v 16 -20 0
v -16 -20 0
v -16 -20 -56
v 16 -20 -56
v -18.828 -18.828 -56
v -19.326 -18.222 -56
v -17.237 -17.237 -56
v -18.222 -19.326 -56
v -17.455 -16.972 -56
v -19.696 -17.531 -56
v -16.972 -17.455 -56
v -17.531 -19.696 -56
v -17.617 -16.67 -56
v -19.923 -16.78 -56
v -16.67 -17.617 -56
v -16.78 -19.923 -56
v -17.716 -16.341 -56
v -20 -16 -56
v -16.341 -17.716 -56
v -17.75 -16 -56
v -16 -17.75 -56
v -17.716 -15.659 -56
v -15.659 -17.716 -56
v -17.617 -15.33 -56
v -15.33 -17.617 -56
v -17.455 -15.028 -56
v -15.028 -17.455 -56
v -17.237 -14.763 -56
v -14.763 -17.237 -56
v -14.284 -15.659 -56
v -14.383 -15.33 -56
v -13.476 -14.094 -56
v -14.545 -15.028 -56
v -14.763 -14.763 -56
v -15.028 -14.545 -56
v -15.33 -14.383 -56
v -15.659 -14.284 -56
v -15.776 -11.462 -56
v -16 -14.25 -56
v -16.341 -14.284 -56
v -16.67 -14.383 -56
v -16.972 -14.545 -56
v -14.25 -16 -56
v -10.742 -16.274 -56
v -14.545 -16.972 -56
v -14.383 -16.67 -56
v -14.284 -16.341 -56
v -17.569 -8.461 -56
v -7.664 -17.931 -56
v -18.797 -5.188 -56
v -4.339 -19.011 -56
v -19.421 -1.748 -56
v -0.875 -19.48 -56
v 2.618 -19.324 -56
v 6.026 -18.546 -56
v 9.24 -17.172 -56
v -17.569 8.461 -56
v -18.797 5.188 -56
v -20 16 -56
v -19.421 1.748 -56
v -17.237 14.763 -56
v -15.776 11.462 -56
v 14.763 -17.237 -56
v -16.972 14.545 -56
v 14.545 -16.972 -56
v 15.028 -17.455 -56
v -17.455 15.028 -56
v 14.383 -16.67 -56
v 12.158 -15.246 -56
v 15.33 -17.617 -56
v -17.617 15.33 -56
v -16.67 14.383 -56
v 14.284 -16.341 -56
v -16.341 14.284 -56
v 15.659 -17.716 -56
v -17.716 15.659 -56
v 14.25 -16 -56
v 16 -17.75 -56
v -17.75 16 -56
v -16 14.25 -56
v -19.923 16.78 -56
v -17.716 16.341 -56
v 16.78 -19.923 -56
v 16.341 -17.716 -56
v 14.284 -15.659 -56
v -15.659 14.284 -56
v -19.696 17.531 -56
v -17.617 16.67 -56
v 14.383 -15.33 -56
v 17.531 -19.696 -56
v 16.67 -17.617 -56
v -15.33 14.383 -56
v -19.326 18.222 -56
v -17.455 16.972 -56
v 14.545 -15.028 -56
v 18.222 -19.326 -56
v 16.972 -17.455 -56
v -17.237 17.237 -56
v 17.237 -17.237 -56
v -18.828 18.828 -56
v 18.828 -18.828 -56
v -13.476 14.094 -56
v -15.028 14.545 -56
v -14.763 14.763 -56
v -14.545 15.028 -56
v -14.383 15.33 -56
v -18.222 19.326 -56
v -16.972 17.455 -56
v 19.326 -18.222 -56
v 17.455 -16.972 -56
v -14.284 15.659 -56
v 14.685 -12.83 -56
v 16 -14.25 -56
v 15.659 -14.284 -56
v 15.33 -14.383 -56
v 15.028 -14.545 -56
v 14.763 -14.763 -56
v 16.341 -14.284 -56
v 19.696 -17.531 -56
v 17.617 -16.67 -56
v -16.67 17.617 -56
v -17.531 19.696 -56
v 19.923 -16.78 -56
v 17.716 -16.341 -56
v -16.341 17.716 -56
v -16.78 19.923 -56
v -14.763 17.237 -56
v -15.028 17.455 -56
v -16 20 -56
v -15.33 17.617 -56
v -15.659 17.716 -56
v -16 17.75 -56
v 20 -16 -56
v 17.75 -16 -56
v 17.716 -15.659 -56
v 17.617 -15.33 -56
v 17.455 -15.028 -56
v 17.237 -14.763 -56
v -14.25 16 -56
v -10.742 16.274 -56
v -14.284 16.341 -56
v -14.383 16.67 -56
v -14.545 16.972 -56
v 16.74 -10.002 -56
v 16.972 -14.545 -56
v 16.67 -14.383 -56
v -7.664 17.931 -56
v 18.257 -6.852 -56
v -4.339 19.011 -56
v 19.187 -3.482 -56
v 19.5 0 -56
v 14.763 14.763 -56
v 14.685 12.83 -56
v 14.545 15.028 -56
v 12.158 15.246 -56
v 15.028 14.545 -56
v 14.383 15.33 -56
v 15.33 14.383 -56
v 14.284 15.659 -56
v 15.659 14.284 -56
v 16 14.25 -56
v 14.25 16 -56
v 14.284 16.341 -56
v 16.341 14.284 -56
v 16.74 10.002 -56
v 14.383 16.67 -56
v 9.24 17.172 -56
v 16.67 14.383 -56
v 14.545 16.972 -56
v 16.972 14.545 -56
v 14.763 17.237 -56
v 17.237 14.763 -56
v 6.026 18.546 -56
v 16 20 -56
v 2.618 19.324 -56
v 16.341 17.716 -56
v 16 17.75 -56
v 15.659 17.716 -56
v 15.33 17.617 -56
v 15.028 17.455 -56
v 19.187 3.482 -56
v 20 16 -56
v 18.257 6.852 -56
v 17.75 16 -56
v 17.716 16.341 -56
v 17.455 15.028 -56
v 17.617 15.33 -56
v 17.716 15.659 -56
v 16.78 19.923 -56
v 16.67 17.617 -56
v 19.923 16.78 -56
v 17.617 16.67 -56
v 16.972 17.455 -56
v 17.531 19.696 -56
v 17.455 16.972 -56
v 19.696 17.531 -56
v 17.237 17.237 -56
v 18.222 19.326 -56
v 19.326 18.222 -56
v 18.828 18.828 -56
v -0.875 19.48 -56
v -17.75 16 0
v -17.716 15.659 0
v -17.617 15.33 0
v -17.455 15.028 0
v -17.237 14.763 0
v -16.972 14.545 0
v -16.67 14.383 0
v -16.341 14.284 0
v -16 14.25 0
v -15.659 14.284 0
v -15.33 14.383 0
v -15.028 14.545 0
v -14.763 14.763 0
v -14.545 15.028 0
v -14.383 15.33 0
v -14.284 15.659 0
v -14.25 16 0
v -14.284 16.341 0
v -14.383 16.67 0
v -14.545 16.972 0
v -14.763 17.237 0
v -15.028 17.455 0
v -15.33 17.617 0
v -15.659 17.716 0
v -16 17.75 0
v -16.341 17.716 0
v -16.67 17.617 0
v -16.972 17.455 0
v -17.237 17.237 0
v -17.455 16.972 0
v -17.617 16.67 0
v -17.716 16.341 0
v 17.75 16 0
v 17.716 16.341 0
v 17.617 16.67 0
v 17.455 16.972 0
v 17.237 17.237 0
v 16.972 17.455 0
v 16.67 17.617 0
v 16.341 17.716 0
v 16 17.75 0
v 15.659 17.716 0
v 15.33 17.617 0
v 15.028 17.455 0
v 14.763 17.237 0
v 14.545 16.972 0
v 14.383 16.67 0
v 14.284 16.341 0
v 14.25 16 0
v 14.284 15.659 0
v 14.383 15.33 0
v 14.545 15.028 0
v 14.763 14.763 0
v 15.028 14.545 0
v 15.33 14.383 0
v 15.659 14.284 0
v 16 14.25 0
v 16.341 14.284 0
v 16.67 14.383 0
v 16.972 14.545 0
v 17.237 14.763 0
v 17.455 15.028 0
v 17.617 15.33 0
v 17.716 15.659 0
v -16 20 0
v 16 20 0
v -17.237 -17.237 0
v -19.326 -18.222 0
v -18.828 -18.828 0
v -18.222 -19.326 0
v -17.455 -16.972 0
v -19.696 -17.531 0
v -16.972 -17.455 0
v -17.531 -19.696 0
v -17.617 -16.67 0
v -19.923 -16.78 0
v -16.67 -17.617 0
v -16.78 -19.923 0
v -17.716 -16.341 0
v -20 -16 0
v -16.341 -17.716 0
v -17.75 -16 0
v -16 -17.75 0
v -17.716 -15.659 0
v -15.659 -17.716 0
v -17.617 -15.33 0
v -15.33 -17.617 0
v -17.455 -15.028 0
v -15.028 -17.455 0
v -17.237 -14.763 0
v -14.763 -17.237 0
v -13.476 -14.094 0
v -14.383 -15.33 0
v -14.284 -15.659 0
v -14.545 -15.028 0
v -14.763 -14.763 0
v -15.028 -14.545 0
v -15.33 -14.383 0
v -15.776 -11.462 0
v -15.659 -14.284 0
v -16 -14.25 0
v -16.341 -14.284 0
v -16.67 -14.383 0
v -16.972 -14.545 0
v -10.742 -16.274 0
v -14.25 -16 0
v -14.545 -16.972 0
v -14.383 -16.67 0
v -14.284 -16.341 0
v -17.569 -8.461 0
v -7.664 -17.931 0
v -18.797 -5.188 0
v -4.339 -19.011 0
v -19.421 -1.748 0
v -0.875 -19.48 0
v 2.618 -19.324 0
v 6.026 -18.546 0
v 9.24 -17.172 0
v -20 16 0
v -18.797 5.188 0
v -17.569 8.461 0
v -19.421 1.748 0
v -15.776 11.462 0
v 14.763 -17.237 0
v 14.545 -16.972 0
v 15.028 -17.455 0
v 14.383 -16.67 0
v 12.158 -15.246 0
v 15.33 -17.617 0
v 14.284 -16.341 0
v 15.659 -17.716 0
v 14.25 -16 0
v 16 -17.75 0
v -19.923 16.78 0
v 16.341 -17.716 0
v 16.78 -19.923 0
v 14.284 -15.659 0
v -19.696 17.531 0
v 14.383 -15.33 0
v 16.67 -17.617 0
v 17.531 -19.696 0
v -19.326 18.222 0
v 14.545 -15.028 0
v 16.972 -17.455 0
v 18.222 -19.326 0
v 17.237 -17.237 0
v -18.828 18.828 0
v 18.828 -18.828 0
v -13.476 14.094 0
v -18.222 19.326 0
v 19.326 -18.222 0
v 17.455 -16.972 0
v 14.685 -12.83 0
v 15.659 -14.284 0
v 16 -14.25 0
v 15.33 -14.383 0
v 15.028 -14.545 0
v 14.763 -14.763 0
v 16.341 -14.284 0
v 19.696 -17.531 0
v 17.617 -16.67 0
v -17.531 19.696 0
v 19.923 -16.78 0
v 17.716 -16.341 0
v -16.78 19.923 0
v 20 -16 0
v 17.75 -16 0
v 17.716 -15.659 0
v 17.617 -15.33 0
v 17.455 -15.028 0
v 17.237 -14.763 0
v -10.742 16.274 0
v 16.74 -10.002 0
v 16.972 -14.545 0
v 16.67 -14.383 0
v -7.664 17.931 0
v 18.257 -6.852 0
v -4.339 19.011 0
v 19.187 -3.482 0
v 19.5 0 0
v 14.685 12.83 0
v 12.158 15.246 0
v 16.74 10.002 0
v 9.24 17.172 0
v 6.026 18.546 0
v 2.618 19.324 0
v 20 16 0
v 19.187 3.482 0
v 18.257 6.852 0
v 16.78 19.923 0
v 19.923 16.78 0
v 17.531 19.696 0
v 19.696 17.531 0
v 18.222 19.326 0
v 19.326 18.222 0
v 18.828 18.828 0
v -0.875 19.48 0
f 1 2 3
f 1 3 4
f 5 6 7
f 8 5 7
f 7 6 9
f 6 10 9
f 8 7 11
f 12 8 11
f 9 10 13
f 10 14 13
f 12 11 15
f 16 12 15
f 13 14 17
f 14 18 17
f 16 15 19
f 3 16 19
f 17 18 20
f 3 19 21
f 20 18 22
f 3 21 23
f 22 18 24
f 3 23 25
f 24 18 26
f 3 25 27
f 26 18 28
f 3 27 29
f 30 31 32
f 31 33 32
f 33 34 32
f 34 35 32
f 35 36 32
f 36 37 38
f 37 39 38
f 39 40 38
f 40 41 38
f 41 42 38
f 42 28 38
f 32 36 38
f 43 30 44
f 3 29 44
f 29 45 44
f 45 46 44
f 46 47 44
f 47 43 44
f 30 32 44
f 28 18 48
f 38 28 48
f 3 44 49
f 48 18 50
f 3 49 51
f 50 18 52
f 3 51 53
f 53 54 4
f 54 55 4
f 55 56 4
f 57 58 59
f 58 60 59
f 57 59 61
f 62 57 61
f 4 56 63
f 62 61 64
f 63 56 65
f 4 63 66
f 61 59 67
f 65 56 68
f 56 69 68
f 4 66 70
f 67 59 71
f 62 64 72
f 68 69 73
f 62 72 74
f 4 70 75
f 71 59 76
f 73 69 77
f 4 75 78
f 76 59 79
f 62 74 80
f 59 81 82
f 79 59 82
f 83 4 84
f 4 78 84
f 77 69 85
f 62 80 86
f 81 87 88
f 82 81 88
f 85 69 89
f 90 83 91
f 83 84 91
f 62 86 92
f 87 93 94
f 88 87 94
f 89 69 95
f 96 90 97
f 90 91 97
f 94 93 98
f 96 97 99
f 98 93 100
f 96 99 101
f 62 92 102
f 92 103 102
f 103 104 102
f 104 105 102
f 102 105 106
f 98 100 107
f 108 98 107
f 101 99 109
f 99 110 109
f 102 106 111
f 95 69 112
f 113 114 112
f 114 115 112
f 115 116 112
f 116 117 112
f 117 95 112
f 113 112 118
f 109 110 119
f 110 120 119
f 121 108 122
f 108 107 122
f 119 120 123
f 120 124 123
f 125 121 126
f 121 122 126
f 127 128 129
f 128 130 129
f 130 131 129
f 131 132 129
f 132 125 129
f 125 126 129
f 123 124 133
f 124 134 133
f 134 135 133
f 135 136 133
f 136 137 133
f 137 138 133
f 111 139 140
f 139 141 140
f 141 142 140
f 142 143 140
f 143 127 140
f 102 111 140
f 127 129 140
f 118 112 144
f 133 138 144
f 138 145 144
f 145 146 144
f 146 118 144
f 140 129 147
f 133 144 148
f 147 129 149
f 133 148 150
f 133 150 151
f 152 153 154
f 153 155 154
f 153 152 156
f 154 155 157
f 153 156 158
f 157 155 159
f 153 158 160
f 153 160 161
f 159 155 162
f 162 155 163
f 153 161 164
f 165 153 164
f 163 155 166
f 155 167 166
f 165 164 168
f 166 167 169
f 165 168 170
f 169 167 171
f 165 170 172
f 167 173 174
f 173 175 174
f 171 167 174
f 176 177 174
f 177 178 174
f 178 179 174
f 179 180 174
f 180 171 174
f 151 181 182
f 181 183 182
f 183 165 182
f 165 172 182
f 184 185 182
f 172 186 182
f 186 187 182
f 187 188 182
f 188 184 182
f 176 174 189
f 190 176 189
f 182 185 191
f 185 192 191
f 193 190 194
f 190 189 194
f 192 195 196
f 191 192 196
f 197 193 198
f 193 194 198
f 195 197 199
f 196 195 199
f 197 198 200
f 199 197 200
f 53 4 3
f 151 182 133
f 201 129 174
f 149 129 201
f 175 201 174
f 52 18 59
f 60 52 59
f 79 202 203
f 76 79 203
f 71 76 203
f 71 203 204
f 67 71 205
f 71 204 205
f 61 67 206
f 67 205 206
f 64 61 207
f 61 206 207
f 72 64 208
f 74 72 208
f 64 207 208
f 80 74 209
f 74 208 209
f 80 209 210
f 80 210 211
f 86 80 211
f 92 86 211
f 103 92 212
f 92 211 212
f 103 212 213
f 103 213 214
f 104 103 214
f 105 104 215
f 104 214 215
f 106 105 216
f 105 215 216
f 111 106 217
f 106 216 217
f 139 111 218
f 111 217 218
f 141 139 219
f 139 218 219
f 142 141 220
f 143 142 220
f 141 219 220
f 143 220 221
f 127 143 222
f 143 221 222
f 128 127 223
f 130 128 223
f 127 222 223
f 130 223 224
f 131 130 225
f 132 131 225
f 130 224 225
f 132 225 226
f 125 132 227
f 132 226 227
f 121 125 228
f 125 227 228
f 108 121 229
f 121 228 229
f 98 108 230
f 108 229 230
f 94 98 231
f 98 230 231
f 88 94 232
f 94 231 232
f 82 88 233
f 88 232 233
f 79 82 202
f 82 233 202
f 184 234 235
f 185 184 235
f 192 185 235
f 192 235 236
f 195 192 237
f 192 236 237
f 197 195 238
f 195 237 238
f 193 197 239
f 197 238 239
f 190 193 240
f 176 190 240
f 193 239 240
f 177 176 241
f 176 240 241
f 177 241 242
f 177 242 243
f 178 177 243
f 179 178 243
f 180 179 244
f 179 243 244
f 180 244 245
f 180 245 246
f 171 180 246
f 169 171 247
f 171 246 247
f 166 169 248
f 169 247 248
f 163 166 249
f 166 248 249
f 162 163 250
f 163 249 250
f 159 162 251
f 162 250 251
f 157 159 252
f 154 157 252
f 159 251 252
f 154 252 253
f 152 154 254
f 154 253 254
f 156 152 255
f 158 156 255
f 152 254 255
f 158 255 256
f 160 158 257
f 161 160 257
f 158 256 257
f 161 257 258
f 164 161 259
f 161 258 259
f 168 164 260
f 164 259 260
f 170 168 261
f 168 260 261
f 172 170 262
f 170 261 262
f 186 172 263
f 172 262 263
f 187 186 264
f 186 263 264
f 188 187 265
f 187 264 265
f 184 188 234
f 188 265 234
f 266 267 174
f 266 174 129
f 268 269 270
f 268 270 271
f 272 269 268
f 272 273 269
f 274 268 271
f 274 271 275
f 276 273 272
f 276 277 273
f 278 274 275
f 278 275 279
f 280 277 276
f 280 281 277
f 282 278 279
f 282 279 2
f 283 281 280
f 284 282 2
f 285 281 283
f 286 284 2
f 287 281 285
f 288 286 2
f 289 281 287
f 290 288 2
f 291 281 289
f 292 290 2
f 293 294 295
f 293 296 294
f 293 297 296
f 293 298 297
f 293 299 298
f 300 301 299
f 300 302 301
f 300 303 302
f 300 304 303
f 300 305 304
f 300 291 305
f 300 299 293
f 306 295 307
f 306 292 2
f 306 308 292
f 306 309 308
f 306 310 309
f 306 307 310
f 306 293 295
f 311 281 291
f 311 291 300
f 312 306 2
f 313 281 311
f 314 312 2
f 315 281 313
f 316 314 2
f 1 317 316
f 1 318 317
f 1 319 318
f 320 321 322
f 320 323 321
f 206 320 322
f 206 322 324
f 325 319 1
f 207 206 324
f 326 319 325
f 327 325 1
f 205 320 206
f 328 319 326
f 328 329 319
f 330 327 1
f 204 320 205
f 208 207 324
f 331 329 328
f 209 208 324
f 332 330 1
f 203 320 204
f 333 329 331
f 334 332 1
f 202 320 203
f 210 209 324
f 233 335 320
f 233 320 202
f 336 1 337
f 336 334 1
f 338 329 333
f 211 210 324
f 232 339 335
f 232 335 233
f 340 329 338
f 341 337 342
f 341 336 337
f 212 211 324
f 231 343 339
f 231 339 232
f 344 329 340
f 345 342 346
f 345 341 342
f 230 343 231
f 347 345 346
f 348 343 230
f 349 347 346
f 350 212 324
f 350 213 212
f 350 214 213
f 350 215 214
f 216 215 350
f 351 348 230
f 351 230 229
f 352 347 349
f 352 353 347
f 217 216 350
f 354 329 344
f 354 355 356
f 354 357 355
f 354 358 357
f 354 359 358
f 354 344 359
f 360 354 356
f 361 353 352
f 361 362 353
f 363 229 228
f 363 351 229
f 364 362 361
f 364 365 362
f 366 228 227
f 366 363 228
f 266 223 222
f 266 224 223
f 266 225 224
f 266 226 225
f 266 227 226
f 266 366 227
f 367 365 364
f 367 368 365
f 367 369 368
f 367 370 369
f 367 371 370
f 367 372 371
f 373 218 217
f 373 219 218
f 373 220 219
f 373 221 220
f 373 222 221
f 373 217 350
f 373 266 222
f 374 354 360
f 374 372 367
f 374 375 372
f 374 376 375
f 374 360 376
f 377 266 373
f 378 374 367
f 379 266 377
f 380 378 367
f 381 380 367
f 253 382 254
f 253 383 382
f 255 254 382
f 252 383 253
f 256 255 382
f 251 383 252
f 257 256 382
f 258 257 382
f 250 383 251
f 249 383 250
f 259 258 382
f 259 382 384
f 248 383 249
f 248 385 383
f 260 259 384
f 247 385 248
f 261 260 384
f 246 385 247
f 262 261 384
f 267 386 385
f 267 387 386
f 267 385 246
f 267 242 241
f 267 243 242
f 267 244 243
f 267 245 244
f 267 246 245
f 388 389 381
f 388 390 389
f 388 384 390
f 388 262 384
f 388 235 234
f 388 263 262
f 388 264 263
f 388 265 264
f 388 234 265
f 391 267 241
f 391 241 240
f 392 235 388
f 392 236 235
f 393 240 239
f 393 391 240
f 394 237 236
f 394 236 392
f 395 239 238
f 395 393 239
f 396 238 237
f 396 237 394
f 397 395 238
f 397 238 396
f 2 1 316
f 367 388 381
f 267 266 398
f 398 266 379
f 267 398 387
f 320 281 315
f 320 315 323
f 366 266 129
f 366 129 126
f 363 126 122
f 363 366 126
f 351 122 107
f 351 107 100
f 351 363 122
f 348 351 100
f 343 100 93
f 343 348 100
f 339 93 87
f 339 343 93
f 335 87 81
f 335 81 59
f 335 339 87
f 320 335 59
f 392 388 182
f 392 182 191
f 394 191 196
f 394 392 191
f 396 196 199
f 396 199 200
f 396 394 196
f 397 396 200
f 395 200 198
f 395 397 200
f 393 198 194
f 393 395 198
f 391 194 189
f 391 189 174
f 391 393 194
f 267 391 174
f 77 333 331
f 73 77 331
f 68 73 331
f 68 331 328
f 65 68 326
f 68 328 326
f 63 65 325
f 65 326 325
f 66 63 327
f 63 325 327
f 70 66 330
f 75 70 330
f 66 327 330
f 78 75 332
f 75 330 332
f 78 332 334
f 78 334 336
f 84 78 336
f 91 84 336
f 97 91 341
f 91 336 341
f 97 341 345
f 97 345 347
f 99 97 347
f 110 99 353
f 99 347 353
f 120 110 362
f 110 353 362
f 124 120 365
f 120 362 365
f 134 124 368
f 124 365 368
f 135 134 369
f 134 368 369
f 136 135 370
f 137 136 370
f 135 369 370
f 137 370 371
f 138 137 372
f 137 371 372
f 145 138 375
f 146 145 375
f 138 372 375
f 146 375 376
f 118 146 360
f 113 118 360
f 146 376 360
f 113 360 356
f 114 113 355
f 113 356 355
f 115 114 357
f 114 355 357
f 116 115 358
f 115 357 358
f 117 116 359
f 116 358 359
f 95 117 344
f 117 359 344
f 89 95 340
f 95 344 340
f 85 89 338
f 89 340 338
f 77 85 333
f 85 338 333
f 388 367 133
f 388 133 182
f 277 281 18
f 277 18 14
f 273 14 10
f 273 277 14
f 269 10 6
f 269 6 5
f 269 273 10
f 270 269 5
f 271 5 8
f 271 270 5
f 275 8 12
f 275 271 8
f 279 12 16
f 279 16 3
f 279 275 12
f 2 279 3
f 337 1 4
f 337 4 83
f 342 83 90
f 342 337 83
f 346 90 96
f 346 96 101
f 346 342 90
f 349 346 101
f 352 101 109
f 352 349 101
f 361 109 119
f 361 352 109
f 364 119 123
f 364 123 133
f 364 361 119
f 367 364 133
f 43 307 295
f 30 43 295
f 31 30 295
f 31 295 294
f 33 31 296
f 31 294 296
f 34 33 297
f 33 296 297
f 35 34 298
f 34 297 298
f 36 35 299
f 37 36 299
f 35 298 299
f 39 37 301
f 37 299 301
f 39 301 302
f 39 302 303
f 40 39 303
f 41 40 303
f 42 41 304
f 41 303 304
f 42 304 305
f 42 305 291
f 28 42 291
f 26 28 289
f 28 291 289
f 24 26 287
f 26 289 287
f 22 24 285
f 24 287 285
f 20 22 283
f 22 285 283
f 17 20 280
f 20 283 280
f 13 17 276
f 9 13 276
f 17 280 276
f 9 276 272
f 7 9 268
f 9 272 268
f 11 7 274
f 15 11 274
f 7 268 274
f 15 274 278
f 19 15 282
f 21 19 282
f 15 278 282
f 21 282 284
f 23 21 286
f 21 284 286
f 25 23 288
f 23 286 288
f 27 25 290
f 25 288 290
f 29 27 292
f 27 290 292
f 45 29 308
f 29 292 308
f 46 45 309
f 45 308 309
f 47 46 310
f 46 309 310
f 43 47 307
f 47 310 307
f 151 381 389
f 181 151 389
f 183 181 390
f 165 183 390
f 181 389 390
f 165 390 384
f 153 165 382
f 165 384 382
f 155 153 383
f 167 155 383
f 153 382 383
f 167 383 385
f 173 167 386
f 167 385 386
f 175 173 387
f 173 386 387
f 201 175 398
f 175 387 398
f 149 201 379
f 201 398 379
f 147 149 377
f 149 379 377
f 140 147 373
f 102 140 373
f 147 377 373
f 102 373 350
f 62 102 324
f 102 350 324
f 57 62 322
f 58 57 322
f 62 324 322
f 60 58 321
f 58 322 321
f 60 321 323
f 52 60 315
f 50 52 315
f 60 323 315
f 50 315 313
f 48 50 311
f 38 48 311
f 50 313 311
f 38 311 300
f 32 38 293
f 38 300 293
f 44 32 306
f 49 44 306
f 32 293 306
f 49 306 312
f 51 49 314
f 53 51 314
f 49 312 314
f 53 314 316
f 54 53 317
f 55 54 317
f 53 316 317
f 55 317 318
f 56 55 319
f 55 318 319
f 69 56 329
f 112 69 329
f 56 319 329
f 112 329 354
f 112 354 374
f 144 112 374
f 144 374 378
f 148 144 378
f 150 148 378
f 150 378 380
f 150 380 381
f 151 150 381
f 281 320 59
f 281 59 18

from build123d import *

# Parameters (mm, degrees)
SKETCH1_R           = 1.75
BOSS_EXTRUDE1_DEPTH = 56
SKETCH2_R           = 19.5
CUT_EXTRUDE1_DEPTH  = 56


with BuildPart() as part:
    # Sketch1 → Boss-Extrude1 (new body)
    with BuildSketch(Plane.XY):
        with BuildLine():
            Line((-16, -20), (16, -20))
            ThreePointArc((16, -20), (18.828427125, -18.828427125), (20, -16))
            Line((20, -16), (20, 16))
            ThreePointArc((20, 16), (18.828427125, 18.828427125), (16, 20))
            Line((16, 20), (-16, 20))
            ThreePointArc((-16, 20), (-18.828427125, 18.828427125), (-20, 16))
            Line((-20, 16), (-20, -16))
            ThreePointArc((-20, -16), (-18.828427125, -18.828427125), (-16, -20))
        make_face()
        with Locations((16, 16)):
            Circle(SKETCH1_R, mode=Mode.SUBTRACT)
        with Locations(Location((-16, 16, 0), (0, 0, 180))):
            Circle(SKETCH1_R, mode=Mode.SUBTRACT)
        with Locations(Location((16, -16, 0), (0, 0, 180))):
            Circle(SKETCH1_R, mode=Mode.SUBTRACT)
        with Locations((-16, -16)):
            Circle(SKETCH1_R, mode=Mode.SUBTRACT)
    extrude(amount=-BOSS_EXTRUDE1_DEPTH)

    # Sketch2 → Cut-Extrude1 (cut)
    with BuildSketch(Plane.XY):
        Circle(SKETCH2_R)
    extrude(amount=-CUT_EXTRUDE1_DEPTH, mode=Mode.SUBTRACT)


solid = part.part
